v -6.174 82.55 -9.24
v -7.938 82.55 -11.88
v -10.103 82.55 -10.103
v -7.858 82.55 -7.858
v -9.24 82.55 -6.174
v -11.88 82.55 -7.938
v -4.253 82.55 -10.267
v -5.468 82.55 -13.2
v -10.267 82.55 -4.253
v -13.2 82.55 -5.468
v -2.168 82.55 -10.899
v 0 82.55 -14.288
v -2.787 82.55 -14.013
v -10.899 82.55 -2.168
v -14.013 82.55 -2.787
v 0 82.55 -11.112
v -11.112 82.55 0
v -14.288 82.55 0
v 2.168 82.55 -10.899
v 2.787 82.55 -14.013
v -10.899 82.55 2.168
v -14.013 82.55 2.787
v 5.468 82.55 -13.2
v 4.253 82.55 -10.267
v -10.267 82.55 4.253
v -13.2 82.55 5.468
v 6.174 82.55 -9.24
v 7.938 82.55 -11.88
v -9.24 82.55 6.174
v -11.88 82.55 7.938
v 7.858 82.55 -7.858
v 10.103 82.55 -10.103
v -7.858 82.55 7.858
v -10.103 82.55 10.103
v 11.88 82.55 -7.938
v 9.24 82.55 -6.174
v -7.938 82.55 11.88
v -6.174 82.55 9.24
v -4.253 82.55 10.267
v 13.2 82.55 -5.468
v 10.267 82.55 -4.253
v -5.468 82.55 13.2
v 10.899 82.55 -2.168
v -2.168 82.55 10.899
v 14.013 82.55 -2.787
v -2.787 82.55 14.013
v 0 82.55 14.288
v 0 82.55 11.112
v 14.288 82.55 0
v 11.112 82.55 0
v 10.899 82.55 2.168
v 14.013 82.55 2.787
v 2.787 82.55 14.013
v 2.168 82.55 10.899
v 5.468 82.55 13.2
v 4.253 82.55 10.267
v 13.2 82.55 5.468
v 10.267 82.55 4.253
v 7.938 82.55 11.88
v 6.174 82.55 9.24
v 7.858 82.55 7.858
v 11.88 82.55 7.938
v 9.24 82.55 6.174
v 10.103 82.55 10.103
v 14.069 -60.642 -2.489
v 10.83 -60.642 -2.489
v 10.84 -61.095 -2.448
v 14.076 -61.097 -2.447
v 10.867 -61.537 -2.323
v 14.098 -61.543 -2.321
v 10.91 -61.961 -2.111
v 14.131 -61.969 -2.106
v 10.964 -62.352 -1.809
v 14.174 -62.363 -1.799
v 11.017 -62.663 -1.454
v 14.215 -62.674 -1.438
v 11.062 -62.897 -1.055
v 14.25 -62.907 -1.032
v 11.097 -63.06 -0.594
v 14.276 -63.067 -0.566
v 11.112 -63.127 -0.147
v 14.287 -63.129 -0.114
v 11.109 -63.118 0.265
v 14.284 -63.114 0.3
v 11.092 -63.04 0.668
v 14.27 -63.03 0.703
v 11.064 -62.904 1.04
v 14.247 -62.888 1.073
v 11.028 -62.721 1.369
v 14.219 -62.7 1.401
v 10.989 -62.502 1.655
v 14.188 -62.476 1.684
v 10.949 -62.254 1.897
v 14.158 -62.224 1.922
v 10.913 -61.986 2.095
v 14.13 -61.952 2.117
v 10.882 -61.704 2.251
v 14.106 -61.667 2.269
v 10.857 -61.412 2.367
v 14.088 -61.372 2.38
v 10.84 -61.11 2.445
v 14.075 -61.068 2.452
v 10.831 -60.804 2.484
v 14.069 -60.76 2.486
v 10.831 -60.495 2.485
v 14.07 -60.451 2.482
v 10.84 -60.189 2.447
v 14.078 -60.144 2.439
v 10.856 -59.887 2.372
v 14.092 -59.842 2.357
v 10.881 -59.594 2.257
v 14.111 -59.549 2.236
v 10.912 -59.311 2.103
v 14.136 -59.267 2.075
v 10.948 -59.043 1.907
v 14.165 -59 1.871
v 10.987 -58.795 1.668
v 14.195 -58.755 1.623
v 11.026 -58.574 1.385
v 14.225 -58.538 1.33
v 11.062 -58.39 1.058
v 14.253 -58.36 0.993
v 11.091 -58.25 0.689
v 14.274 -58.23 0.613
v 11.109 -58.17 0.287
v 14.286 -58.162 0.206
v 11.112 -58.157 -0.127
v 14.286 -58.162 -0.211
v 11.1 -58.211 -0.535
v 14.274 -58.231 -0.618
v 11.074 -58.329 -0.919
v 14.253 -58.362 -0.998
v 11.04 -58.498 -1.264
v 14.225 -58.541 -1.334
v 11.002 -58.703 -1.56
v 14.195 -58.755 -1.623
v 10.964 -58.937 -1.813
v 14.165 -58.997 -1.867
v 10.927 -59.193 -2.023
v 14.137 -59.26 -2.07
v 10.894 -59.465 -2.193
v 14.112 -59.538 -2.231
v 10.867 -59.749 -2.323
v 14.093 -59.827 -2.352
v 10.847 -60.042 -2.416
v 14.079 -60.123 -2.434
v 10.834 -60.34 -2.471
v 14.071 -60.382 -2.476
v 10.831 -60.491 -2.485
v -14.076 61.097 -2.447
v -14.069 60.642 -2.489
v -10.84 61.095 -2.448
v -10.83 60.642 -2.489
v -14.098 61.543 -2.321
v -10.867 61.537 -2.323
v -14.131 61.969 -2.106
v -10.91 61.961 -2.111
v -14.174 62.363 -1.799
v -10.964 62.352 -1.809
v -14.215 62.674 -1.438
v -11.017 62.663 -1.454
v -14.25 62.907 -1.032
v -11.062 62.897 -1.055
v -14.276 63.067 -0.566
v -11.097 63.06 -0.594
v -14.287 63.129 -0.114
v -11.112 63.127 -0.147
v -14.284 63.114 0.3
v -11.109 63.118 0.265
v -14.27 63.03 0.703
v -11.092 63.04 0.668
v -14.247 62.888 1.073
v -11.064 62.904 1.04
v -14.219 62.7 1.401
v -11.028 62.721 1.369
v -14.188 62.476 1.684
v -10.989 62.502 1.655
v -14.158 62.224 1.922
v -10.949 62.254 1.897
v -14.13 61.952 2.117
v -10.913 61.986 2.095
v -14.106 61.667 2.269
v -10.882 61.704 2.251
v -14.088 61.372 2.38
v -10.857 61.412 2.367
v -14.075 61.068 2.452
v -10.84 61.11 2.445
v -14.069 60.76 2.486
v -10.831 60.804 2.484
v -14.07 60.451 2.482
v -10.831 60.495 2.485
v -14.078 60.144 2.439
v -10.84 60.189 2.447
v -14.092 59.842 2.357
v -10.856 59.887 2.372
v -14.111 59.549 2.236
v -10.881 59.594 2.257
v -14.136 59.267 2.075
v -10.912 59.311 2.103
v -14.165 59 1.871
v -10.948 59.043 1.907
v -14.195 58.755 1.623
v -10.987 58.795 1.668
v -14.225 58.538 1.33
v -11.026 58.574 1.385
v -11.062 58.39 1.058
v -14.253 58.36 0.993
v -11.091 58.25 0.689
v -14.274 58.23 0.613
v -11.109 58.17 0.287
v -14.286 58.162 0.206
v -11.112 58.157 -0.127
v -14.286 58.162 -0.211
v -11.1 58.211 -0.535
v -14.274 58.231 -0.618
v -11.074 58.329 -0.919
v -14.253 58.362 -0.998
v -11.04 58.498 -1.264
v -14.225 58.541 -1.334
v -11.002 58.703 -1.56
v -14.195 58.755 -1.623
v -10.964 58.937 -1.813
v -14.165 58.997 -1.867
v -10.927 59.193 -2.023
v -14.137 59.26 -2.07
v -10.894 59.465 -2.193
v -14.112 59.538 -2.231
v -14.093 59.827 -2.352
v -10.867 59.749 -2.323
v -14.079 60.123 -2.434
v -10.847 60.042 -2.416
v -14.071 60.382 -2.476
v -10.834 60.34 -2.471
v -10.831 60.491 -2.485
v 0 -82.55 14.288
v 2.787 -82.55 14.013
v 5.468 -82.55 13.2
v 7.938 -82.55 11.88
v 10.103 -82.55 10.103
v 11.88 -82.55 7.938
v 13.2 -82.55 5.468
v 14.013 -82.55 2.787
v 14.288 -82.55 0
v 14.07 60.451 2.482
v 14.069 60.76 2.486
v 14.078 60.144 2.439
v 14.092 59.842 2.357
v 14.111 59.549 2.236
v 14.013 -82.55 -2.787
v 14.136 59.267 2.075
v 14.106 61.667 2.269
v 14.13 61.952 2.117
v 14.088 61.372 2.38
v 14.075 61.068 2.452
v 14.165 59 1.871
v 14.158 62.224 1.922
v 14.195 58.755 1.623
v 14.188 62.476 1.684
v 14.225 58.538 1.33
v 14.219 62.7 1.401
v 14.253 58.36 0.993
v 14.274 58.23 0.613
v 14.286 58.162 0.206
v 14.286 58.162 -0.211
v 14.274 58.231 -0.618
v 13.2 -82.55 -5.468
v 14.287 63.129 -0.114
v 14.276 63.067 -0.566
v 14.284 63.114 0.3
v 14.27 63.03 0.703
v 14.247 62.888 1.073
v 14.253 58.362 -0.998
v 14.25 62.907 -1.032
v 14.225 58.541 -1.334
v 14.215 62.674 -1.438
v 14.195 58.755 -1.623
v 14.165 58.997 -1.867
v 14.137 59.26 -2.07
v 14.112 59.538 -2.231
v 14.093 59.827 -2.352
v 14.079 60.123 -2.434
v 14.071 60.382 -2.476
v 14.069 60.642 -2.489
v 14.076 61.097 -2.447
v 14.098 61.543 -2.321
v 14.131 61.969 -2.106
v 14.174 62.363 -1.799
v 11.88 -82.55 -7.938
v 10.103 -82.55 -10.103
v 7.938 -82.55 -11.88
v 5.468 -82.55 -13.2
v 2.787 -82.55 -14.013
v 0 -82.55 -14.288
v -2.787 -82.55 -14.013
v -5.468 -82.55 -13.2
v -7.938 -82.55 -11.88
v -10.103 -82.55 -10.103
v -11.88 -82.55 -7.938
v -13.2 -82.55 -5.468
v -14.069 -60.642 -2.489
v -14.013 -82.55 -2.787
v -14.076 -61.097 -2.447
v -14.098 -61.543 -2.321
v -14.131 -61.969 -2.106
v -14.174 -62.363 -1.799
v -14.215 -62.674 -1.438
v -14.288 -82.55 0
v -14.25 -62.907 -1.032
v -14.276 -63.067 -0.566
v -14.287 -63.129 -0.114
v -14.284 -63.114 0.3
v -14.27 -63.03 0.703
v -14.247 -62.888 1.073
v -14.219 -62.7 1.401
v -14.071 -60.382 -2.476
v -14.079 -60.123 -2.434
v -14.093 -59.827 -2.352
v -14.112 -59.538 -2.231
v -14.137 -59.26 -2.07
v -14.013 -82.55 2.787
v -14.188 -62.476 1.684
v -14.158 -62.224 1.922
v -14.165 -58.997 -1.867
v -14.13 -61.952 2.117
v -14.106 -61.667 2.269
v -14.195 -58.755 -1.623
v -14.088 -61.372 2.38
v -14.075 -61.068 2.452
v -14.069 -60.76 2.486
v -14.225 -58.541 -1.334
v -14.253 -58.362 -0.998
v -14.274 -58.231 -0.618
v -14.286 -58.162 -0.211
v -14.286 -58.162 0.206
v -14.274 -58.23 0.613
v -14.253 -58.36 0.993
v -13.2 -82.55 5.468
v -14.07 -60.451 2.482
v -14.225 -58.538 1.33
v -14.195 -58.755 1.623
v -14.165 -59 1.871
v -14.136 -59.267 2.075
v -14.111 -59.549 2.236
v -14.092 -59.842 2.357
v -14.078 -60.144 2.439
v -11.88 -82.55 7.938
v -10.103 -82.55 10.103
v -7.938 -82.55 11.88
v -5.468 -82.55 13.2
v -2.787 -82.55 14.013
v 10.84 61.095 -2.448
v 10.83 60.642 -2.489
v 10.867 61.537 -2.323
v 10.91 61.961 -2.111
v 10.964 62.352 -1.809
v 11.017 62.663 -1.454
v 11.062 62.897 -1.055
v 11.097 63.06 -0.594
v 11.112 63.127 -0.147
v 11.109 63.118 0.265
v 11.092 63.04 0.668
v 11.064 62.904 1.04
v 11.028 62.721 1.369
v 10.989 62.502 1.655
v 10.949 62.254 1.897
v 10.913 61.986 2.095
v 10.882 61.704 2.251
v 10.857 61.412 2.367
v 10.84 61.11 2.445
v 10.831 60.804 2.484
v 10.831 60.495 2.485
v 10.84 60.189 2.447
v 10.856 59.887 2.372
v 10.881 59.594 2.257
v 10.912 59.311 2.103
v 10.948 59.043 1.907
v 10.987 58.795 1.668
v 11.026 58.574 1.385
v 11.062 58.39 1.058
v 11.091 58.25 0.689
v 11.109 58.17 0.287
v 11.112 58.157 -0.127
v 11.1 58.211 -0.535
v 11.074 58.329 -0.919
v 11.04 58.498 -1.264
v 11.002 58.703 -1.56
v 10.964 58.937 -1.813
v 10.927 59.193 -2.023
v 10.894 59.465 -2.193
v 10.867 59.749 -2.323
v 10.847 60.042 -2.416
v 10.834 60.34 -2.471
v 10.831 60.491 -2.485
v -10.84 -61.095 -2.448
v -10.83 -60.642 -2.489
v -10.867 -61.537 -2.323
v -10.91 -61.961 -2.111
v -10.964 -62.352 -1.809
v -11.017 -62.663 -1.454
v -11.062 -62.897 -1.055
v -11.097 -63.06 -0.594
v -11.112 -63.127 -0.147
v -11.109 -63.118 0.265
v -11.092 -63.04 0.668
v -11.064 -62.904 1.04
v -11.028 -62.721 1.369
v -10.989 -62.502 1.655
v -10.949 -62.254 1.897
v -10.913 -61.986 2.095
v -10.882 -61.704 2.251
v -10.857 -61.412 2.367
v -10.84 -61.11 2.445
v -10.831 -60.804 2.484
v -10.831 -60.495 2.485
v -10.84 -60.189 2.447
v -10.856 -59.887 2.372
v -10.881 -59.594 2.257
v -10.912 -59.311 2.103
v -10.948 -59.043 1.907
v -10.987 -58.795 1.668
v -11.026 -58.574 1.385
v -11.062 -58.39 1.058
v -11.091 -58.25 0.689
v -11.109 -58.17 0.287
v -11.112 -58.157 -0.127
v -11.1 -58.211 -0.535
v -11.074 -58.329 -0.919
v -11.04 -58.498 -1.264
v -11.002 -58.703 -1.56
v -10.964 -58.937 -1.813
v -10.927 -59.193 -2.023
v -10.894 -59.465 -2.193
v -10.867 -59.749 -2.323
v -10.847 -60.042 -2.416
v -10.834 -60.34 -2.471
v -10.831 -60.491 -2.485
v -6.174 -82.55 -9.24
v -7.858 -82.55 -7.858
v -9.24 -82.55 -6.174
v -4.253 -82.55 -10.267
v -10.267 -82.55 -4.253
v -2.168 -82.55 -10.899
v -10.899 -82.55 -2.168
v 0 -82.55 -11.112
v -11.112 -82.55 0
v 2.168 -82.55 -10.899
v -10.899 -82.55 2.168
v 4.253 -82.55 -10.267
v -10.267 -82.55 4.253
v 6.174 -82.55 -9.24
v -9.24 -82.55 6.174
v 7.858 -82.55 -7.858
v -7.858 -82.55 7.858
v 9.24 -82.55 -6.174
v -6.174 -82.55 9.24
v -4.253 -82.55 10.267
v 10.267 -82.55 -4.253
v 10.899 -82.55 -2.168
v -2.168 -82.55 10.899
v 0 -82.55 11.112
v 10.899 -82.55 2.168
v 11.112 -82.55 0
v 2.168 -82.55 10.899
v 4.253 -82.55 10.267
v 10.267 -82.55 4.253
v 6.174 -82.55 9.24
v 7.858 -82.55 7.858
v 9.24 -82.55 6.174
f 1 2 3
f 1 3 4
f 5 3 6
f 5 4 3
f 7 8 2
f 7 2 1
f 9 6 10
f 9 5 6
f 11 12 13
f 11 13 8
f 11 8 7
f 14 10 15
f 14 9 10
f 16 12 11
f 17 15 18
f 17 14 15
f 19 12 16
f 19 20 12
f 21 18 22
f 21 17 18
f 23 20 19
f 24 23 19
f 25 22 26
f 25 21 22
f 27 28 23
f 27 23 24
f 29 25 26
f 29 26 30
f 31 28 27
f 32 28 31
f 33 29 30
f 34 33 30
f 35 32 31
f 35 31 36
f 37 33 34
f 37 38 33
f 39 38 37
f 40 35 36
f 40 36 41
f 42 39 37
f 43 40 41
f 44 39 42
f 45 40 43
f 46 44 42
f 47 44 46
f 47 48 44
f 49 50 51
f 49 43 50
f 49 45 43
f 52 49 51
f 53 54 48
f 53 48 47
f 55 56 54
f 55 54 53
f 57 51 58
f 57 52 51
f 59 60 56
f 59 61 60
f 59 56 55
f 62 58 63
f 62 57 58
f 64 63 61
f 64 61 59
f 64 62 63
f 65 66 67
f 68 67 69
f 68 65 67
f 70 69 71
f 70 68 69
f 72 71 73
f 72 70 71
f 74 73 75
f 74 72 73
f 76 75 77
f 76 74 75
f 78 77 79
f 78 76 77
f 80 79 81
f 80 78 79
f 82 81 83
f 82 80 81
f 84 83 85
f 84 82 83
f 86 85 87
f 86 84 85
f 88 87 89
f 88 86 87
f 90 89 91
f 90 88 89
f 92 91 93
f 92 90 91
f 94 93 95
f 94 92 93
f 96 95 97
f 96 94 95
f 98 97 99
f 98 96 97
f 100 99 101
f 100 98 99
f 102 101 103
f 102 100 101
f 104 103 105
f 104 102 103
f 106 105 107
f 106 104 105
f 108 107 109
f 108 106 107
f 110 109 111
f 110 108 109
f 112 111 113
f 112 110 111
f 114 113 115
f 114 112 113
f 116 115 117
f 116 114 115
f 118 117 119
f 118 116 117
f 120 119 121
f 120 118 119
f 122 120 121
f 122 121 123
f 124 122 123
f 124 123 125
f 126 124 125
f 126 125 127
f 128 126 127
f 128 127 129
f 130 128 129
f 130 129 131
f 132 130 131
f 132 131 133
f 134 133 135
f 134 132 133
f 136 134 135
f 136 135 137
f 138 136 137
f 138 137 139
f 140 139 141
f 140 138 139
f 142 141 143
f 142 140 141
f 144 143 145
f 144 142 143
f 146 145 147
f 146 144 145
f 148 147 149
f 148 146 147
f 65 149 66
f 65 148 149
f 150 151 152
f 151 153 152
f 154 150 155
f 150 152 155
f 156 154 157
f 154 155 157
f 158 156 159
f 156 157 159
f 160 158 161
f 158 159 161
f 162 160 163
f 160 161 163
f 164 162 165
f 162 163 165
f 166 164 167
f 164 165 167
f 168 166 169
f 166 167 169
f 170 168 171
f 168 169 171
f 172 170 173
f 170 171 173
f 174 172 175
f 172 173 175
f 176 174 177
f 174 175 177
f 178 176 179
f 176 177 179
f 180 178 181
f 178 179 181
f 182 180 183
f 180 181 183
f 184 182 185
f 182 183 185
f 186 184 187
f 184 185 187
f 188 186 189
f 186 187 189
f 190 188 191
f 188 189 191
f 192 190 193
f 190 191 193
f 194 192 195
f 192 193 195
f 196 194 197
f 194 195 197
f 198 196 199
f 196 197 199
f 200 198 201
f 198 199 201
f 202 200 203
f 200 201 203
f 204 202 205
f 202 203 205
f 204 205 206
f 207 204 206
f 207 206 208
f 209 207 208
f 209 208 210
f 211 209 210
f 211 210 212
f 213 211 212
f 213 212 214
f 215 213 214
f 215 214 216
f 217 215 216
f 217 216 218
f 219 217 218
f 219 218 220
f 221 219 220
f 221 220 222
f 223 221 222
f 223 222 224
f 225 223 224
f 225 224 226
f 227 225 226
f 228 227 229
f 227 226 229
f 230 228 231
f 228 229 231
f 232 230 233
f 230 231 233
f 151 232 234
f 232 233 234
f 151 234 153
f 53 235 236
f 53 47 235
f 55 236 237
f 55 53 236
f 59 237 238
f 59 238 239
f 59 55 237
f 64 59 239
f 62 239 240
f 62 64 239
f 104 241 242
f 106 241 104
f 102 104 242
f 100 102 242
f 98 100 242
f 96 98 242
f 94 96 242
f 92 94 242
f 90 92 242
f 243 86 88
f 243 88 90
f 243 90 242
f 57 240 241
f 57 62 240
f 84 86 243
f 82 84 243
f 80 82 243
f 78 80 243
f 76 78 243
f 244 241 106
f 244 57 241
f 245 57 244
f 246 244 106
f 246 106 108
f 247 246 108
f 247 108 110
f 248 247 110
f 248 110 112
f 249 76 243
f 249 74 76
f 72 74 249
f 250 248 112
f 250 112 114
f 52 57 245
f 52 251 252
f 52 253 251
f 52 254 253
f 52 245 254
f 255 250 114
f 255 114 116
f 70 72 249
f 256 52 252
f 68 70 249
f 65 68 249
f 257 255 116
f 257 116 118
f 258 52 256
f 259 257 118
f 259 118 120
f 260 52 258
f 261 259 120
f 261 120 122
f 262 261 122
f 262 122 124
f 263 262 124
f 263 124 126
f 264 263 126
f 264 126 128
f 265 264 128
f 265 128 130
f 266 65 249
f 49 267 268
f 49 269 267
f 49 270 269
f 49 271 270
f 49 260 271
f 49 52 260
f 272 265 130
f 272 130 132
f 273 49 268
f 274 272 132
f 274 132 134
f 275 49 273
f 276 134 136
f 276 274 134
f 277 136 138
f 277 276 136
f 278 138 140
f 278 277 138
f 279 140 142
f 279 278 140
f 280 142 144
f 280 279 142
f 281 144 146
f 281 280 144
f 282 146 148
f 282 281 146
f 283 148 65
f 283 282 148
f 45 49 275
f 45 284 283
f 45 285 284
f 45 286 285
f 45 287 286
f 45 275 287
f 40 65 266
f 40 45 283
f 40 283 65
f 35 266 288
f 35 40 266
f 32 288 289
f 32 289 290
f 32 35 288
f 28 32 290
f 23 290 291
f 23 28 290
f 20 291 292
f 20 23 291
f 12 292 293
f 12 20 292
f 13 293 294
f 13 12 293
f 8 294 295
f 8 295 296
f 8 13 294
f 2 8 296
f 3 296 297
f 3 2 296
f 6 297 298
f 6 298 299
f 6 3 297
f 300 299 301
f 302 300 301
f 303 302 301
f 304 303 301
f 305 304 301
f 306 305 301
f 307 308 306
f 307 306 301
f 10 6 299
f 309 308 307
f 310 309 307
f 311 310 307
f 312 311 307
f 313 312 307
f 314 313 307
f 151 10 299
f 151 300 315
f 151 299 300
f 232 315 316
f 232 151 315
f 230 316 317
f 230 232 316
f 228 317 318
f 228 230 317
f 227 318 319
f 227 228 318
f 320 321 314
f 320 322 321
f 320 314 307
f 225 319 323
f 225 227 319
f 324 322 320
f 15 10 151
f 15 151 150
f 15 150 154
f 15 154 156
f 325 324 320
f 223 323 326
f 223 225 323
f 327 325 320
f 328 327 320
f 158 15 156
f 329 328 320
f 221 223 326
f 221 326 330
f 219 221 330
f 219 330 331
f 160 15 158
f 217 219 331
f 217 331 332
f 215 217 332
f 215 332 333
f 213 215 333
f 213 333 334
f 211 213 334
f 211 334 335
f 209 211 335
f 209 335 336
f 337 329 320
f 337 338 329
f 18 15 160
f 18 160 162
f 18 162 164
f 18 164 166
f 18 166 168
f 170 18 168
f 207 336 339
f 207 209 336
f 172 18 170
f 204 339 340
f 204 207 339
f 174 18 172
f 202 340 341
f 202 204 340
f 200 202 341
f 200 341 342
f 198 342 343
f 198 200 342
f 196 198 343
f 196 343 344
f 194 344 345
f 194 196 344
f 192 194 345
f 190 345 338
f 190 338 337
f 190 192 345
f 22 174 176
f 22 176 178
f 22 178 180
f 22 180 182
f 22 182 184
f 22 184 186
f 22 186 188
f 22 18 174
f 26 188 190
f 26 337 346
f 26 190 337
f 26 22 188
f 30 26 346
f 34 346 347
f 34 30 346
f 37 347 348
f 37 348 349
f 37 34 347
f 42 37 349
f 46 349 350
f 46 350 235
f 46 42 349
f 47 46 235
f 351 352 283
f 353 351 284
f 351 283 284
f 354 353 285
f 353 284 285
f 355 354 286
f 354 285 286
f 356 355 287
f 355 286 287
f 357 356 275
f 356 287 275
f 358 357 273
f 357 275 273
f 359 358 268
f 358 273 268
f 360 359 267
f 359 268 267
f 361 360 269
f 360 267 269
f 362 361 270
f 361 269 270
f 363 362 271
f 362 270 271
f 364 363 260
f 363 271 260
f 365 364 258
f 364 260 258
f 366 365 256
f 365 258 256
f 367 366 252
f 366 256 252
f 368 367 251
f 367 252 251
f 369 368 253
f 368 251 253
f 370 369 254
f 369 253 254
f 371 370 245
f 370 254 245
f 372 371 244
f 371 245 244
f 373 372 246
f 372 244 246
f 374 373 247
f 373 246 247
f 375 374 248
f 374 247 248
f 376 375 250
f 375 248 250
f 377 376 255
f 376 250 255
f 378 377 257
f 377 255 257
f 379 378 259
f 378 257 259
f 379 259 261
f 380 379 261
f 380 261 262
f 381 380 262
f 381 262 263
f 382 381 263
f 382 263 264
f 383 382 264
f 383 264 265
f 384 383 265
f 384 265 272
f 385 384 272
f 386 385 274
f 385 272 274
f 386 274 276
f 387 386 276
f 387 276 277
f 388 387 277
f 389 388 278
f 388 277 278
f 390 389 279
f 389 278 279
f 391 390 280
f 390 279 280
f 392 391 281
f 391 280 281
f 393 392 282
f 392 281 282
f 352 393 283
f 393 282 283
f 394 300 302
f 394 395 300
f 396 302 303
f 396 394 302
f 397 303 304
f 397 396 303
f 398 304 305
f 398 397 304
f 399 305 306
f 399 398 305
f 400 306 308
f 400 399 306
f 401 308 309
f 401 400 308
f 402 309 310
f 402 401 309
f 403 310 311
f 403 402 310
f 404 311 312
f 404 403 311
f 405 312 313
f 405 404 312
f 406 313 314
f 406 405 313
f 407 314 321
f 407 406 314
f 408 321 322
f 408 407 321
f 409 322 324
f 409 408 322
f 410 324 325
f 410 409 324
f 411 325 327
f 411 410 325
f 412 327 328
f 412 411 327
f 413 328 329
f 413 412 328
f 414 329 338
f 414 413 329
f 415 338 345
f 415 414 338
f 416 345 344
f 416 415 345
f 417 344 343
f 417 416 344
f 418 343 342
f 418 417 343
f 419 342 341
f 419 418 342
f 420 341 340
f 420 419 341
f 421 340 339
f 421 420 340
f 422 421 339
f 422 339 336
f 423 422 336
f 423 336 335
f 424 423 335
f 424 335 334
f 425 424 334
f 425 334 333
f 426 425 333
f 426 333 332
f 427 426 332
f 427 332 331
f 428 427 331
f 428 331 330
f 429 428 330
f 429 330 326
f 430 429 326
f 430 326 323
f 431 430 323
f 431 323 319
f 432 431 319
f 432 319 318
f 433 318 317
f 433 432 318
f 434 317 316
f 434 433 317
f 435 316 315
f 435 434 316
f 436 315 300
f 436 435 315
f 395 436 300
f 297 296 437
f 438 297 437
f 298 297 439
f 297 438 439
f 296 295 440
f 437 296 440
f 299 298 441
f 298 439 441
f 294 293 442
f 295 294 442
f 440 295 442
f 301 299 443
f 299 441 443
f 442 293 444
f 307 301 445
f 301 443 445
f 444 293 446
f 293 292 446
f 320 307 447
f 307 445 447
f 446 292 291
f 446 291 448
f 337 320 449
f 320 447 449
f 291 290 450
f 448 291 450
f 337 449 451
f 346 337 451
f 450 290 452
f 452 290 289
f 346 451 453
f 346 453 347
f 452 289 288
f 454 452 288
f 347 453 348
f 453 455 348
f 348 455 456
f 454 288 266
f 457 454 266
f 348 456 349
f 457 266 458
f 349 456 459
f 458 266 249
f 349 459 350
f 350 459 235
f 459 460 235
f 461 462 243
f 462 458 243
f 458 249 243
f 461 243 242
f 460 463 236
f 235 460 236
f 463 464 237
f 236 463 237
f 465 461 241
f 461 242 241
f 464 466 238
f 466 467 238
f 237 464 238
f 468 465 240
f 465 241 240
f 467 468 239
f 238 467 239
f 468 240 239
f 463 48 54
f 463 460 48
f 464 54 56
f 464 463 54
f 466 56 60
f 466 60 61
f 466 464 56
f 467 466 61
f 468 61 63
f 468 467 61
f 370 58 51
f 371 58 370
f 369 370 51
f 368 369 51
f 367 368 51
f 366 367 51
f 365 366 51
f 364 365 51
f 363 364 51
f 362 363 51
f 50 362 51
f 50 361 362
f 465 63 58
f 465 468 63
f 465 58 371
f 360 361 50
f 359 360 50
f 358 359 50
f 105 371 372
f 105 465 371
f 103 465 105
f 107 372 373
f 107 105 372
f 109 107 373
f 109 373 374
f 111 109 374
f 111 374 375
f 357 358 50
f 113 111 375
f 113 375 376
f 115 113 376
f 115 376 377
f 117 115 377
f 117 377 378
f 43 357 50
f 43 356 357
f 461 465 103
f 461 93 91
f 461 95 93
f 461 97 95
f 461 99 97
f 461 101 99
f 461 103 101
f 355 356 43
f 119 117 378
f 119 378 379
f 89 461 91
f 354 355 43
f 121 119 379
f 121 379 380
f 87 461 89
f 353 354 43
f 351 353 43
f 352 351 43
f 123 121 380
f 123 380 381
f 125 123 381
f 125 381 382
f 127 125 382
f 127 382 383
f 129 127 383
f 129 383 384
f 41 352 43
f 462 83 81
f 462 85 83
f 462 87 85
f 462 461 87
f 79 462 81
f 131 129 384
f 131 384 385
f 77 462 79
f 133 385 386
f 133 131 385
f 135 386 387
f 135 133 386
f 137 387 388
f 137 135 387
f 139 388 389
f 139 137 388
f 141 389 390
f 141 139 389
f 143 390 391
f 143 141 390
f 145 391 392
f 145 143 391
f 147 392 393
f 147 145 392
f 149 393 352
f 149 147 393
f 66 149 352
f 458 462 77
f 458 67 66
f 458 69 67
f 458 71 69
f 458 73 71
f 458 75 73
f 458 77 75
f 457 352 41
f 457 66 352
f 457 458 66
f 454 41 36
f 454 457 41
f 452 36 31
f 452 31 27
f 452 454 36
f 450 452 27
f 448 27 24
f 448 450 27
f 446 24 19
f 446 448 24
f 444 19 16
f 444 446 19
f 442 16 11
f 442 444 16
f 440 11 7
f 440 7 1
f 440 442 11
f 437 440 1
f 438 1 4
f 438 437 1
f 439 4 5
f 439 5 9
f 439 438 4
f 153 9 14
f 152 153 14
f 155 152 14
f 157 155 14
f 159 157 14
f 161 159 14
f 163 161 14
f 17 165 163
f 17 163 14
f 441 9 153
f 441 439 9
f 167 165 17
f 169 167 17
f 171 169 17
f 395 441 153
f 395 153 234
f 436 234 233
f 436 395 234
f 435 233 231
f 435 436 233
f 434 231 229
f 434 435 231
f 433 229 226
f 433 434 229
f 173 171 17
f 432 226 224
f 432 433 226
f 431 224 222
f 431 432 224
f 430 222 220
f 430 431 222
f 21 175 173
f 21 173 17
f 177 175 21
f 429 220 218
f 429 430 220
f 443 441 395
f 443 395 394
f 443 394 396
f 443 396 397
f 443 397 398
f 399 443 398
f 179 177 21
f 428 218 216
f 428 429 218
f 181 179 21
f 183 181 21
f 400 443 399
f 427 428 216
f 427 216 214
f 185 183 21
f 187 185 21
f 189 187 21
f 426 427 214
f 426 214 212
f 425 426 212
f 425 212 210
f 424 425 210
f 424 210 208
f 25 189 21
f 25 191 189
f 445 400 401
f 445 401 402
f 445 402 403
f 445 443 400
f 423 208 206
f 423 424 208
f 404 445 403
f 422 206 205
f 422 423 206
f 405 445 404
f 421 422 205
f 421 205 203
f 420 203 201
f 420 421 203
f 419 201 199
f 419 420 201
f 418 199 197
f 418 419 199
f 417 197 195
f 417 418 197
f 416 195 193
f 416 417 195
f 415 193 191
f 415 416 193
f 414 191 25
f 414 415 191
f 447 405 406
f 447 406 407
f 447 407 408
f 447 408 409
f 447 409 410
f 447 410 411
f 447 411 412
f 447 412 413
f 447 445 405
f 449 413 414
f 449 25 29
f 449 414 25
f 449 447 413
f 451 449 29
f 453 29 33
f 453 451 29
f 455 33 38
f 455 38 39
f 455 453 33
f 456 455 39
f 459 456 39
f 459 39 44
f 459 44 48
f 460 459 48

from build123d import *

# Parameters (mm, degrees)
SKETCH1_R           = 14.2875
SKETCH1_R_2         = 11.1125
BOSS_EXTRUDE1_DEPTH = 82.55
SKETCH2_R           = 2.4892
CUT_EXTRUDE1_DEPTH  = 85.986868471


with BuildPart() as part:
    # Sketch1 → Boss-Extrude1 (new, symmetric)
    with BuildSketch(Plane(origin=(0, 0, 0), x_dir=(1, 0, 0), z_dir=(0, 1, 0))):
        with Locations(Location((0, 0, 0), (0, 0, 270))):
            Circle(SKETCH1_R)
        with Locations(Location((0, 0, 0), (0, 0, 270))):
            Circle(SKETCH1_R_2, mode=Mode.SUBTRACT)
    extrude(amount=BOSS_EXTRUDE1_DEPTH, both=True)

    # Sketch2 → Cut-Extrude1 (cut, symmetric)
    with BuildSketch(Plane(origin=(0, 0, 0), x_dir=(0, 0, -1), z_dir=(1, 0, 0))):
        with Locations((0, 60.6425)):
            Circle(SKETCH2_R)
    cut_extrude1 = extrude(amount=CUT_EXTRUDE1_DEPTH, both=True, mode=Mode.SUBTRACT)

    # Mirror1: Cut-Extrude1 across plane
    add(cut_extrude1.mirror(Plane.ZX), mode=Mode.SUBTRACT)


solid = part.part
